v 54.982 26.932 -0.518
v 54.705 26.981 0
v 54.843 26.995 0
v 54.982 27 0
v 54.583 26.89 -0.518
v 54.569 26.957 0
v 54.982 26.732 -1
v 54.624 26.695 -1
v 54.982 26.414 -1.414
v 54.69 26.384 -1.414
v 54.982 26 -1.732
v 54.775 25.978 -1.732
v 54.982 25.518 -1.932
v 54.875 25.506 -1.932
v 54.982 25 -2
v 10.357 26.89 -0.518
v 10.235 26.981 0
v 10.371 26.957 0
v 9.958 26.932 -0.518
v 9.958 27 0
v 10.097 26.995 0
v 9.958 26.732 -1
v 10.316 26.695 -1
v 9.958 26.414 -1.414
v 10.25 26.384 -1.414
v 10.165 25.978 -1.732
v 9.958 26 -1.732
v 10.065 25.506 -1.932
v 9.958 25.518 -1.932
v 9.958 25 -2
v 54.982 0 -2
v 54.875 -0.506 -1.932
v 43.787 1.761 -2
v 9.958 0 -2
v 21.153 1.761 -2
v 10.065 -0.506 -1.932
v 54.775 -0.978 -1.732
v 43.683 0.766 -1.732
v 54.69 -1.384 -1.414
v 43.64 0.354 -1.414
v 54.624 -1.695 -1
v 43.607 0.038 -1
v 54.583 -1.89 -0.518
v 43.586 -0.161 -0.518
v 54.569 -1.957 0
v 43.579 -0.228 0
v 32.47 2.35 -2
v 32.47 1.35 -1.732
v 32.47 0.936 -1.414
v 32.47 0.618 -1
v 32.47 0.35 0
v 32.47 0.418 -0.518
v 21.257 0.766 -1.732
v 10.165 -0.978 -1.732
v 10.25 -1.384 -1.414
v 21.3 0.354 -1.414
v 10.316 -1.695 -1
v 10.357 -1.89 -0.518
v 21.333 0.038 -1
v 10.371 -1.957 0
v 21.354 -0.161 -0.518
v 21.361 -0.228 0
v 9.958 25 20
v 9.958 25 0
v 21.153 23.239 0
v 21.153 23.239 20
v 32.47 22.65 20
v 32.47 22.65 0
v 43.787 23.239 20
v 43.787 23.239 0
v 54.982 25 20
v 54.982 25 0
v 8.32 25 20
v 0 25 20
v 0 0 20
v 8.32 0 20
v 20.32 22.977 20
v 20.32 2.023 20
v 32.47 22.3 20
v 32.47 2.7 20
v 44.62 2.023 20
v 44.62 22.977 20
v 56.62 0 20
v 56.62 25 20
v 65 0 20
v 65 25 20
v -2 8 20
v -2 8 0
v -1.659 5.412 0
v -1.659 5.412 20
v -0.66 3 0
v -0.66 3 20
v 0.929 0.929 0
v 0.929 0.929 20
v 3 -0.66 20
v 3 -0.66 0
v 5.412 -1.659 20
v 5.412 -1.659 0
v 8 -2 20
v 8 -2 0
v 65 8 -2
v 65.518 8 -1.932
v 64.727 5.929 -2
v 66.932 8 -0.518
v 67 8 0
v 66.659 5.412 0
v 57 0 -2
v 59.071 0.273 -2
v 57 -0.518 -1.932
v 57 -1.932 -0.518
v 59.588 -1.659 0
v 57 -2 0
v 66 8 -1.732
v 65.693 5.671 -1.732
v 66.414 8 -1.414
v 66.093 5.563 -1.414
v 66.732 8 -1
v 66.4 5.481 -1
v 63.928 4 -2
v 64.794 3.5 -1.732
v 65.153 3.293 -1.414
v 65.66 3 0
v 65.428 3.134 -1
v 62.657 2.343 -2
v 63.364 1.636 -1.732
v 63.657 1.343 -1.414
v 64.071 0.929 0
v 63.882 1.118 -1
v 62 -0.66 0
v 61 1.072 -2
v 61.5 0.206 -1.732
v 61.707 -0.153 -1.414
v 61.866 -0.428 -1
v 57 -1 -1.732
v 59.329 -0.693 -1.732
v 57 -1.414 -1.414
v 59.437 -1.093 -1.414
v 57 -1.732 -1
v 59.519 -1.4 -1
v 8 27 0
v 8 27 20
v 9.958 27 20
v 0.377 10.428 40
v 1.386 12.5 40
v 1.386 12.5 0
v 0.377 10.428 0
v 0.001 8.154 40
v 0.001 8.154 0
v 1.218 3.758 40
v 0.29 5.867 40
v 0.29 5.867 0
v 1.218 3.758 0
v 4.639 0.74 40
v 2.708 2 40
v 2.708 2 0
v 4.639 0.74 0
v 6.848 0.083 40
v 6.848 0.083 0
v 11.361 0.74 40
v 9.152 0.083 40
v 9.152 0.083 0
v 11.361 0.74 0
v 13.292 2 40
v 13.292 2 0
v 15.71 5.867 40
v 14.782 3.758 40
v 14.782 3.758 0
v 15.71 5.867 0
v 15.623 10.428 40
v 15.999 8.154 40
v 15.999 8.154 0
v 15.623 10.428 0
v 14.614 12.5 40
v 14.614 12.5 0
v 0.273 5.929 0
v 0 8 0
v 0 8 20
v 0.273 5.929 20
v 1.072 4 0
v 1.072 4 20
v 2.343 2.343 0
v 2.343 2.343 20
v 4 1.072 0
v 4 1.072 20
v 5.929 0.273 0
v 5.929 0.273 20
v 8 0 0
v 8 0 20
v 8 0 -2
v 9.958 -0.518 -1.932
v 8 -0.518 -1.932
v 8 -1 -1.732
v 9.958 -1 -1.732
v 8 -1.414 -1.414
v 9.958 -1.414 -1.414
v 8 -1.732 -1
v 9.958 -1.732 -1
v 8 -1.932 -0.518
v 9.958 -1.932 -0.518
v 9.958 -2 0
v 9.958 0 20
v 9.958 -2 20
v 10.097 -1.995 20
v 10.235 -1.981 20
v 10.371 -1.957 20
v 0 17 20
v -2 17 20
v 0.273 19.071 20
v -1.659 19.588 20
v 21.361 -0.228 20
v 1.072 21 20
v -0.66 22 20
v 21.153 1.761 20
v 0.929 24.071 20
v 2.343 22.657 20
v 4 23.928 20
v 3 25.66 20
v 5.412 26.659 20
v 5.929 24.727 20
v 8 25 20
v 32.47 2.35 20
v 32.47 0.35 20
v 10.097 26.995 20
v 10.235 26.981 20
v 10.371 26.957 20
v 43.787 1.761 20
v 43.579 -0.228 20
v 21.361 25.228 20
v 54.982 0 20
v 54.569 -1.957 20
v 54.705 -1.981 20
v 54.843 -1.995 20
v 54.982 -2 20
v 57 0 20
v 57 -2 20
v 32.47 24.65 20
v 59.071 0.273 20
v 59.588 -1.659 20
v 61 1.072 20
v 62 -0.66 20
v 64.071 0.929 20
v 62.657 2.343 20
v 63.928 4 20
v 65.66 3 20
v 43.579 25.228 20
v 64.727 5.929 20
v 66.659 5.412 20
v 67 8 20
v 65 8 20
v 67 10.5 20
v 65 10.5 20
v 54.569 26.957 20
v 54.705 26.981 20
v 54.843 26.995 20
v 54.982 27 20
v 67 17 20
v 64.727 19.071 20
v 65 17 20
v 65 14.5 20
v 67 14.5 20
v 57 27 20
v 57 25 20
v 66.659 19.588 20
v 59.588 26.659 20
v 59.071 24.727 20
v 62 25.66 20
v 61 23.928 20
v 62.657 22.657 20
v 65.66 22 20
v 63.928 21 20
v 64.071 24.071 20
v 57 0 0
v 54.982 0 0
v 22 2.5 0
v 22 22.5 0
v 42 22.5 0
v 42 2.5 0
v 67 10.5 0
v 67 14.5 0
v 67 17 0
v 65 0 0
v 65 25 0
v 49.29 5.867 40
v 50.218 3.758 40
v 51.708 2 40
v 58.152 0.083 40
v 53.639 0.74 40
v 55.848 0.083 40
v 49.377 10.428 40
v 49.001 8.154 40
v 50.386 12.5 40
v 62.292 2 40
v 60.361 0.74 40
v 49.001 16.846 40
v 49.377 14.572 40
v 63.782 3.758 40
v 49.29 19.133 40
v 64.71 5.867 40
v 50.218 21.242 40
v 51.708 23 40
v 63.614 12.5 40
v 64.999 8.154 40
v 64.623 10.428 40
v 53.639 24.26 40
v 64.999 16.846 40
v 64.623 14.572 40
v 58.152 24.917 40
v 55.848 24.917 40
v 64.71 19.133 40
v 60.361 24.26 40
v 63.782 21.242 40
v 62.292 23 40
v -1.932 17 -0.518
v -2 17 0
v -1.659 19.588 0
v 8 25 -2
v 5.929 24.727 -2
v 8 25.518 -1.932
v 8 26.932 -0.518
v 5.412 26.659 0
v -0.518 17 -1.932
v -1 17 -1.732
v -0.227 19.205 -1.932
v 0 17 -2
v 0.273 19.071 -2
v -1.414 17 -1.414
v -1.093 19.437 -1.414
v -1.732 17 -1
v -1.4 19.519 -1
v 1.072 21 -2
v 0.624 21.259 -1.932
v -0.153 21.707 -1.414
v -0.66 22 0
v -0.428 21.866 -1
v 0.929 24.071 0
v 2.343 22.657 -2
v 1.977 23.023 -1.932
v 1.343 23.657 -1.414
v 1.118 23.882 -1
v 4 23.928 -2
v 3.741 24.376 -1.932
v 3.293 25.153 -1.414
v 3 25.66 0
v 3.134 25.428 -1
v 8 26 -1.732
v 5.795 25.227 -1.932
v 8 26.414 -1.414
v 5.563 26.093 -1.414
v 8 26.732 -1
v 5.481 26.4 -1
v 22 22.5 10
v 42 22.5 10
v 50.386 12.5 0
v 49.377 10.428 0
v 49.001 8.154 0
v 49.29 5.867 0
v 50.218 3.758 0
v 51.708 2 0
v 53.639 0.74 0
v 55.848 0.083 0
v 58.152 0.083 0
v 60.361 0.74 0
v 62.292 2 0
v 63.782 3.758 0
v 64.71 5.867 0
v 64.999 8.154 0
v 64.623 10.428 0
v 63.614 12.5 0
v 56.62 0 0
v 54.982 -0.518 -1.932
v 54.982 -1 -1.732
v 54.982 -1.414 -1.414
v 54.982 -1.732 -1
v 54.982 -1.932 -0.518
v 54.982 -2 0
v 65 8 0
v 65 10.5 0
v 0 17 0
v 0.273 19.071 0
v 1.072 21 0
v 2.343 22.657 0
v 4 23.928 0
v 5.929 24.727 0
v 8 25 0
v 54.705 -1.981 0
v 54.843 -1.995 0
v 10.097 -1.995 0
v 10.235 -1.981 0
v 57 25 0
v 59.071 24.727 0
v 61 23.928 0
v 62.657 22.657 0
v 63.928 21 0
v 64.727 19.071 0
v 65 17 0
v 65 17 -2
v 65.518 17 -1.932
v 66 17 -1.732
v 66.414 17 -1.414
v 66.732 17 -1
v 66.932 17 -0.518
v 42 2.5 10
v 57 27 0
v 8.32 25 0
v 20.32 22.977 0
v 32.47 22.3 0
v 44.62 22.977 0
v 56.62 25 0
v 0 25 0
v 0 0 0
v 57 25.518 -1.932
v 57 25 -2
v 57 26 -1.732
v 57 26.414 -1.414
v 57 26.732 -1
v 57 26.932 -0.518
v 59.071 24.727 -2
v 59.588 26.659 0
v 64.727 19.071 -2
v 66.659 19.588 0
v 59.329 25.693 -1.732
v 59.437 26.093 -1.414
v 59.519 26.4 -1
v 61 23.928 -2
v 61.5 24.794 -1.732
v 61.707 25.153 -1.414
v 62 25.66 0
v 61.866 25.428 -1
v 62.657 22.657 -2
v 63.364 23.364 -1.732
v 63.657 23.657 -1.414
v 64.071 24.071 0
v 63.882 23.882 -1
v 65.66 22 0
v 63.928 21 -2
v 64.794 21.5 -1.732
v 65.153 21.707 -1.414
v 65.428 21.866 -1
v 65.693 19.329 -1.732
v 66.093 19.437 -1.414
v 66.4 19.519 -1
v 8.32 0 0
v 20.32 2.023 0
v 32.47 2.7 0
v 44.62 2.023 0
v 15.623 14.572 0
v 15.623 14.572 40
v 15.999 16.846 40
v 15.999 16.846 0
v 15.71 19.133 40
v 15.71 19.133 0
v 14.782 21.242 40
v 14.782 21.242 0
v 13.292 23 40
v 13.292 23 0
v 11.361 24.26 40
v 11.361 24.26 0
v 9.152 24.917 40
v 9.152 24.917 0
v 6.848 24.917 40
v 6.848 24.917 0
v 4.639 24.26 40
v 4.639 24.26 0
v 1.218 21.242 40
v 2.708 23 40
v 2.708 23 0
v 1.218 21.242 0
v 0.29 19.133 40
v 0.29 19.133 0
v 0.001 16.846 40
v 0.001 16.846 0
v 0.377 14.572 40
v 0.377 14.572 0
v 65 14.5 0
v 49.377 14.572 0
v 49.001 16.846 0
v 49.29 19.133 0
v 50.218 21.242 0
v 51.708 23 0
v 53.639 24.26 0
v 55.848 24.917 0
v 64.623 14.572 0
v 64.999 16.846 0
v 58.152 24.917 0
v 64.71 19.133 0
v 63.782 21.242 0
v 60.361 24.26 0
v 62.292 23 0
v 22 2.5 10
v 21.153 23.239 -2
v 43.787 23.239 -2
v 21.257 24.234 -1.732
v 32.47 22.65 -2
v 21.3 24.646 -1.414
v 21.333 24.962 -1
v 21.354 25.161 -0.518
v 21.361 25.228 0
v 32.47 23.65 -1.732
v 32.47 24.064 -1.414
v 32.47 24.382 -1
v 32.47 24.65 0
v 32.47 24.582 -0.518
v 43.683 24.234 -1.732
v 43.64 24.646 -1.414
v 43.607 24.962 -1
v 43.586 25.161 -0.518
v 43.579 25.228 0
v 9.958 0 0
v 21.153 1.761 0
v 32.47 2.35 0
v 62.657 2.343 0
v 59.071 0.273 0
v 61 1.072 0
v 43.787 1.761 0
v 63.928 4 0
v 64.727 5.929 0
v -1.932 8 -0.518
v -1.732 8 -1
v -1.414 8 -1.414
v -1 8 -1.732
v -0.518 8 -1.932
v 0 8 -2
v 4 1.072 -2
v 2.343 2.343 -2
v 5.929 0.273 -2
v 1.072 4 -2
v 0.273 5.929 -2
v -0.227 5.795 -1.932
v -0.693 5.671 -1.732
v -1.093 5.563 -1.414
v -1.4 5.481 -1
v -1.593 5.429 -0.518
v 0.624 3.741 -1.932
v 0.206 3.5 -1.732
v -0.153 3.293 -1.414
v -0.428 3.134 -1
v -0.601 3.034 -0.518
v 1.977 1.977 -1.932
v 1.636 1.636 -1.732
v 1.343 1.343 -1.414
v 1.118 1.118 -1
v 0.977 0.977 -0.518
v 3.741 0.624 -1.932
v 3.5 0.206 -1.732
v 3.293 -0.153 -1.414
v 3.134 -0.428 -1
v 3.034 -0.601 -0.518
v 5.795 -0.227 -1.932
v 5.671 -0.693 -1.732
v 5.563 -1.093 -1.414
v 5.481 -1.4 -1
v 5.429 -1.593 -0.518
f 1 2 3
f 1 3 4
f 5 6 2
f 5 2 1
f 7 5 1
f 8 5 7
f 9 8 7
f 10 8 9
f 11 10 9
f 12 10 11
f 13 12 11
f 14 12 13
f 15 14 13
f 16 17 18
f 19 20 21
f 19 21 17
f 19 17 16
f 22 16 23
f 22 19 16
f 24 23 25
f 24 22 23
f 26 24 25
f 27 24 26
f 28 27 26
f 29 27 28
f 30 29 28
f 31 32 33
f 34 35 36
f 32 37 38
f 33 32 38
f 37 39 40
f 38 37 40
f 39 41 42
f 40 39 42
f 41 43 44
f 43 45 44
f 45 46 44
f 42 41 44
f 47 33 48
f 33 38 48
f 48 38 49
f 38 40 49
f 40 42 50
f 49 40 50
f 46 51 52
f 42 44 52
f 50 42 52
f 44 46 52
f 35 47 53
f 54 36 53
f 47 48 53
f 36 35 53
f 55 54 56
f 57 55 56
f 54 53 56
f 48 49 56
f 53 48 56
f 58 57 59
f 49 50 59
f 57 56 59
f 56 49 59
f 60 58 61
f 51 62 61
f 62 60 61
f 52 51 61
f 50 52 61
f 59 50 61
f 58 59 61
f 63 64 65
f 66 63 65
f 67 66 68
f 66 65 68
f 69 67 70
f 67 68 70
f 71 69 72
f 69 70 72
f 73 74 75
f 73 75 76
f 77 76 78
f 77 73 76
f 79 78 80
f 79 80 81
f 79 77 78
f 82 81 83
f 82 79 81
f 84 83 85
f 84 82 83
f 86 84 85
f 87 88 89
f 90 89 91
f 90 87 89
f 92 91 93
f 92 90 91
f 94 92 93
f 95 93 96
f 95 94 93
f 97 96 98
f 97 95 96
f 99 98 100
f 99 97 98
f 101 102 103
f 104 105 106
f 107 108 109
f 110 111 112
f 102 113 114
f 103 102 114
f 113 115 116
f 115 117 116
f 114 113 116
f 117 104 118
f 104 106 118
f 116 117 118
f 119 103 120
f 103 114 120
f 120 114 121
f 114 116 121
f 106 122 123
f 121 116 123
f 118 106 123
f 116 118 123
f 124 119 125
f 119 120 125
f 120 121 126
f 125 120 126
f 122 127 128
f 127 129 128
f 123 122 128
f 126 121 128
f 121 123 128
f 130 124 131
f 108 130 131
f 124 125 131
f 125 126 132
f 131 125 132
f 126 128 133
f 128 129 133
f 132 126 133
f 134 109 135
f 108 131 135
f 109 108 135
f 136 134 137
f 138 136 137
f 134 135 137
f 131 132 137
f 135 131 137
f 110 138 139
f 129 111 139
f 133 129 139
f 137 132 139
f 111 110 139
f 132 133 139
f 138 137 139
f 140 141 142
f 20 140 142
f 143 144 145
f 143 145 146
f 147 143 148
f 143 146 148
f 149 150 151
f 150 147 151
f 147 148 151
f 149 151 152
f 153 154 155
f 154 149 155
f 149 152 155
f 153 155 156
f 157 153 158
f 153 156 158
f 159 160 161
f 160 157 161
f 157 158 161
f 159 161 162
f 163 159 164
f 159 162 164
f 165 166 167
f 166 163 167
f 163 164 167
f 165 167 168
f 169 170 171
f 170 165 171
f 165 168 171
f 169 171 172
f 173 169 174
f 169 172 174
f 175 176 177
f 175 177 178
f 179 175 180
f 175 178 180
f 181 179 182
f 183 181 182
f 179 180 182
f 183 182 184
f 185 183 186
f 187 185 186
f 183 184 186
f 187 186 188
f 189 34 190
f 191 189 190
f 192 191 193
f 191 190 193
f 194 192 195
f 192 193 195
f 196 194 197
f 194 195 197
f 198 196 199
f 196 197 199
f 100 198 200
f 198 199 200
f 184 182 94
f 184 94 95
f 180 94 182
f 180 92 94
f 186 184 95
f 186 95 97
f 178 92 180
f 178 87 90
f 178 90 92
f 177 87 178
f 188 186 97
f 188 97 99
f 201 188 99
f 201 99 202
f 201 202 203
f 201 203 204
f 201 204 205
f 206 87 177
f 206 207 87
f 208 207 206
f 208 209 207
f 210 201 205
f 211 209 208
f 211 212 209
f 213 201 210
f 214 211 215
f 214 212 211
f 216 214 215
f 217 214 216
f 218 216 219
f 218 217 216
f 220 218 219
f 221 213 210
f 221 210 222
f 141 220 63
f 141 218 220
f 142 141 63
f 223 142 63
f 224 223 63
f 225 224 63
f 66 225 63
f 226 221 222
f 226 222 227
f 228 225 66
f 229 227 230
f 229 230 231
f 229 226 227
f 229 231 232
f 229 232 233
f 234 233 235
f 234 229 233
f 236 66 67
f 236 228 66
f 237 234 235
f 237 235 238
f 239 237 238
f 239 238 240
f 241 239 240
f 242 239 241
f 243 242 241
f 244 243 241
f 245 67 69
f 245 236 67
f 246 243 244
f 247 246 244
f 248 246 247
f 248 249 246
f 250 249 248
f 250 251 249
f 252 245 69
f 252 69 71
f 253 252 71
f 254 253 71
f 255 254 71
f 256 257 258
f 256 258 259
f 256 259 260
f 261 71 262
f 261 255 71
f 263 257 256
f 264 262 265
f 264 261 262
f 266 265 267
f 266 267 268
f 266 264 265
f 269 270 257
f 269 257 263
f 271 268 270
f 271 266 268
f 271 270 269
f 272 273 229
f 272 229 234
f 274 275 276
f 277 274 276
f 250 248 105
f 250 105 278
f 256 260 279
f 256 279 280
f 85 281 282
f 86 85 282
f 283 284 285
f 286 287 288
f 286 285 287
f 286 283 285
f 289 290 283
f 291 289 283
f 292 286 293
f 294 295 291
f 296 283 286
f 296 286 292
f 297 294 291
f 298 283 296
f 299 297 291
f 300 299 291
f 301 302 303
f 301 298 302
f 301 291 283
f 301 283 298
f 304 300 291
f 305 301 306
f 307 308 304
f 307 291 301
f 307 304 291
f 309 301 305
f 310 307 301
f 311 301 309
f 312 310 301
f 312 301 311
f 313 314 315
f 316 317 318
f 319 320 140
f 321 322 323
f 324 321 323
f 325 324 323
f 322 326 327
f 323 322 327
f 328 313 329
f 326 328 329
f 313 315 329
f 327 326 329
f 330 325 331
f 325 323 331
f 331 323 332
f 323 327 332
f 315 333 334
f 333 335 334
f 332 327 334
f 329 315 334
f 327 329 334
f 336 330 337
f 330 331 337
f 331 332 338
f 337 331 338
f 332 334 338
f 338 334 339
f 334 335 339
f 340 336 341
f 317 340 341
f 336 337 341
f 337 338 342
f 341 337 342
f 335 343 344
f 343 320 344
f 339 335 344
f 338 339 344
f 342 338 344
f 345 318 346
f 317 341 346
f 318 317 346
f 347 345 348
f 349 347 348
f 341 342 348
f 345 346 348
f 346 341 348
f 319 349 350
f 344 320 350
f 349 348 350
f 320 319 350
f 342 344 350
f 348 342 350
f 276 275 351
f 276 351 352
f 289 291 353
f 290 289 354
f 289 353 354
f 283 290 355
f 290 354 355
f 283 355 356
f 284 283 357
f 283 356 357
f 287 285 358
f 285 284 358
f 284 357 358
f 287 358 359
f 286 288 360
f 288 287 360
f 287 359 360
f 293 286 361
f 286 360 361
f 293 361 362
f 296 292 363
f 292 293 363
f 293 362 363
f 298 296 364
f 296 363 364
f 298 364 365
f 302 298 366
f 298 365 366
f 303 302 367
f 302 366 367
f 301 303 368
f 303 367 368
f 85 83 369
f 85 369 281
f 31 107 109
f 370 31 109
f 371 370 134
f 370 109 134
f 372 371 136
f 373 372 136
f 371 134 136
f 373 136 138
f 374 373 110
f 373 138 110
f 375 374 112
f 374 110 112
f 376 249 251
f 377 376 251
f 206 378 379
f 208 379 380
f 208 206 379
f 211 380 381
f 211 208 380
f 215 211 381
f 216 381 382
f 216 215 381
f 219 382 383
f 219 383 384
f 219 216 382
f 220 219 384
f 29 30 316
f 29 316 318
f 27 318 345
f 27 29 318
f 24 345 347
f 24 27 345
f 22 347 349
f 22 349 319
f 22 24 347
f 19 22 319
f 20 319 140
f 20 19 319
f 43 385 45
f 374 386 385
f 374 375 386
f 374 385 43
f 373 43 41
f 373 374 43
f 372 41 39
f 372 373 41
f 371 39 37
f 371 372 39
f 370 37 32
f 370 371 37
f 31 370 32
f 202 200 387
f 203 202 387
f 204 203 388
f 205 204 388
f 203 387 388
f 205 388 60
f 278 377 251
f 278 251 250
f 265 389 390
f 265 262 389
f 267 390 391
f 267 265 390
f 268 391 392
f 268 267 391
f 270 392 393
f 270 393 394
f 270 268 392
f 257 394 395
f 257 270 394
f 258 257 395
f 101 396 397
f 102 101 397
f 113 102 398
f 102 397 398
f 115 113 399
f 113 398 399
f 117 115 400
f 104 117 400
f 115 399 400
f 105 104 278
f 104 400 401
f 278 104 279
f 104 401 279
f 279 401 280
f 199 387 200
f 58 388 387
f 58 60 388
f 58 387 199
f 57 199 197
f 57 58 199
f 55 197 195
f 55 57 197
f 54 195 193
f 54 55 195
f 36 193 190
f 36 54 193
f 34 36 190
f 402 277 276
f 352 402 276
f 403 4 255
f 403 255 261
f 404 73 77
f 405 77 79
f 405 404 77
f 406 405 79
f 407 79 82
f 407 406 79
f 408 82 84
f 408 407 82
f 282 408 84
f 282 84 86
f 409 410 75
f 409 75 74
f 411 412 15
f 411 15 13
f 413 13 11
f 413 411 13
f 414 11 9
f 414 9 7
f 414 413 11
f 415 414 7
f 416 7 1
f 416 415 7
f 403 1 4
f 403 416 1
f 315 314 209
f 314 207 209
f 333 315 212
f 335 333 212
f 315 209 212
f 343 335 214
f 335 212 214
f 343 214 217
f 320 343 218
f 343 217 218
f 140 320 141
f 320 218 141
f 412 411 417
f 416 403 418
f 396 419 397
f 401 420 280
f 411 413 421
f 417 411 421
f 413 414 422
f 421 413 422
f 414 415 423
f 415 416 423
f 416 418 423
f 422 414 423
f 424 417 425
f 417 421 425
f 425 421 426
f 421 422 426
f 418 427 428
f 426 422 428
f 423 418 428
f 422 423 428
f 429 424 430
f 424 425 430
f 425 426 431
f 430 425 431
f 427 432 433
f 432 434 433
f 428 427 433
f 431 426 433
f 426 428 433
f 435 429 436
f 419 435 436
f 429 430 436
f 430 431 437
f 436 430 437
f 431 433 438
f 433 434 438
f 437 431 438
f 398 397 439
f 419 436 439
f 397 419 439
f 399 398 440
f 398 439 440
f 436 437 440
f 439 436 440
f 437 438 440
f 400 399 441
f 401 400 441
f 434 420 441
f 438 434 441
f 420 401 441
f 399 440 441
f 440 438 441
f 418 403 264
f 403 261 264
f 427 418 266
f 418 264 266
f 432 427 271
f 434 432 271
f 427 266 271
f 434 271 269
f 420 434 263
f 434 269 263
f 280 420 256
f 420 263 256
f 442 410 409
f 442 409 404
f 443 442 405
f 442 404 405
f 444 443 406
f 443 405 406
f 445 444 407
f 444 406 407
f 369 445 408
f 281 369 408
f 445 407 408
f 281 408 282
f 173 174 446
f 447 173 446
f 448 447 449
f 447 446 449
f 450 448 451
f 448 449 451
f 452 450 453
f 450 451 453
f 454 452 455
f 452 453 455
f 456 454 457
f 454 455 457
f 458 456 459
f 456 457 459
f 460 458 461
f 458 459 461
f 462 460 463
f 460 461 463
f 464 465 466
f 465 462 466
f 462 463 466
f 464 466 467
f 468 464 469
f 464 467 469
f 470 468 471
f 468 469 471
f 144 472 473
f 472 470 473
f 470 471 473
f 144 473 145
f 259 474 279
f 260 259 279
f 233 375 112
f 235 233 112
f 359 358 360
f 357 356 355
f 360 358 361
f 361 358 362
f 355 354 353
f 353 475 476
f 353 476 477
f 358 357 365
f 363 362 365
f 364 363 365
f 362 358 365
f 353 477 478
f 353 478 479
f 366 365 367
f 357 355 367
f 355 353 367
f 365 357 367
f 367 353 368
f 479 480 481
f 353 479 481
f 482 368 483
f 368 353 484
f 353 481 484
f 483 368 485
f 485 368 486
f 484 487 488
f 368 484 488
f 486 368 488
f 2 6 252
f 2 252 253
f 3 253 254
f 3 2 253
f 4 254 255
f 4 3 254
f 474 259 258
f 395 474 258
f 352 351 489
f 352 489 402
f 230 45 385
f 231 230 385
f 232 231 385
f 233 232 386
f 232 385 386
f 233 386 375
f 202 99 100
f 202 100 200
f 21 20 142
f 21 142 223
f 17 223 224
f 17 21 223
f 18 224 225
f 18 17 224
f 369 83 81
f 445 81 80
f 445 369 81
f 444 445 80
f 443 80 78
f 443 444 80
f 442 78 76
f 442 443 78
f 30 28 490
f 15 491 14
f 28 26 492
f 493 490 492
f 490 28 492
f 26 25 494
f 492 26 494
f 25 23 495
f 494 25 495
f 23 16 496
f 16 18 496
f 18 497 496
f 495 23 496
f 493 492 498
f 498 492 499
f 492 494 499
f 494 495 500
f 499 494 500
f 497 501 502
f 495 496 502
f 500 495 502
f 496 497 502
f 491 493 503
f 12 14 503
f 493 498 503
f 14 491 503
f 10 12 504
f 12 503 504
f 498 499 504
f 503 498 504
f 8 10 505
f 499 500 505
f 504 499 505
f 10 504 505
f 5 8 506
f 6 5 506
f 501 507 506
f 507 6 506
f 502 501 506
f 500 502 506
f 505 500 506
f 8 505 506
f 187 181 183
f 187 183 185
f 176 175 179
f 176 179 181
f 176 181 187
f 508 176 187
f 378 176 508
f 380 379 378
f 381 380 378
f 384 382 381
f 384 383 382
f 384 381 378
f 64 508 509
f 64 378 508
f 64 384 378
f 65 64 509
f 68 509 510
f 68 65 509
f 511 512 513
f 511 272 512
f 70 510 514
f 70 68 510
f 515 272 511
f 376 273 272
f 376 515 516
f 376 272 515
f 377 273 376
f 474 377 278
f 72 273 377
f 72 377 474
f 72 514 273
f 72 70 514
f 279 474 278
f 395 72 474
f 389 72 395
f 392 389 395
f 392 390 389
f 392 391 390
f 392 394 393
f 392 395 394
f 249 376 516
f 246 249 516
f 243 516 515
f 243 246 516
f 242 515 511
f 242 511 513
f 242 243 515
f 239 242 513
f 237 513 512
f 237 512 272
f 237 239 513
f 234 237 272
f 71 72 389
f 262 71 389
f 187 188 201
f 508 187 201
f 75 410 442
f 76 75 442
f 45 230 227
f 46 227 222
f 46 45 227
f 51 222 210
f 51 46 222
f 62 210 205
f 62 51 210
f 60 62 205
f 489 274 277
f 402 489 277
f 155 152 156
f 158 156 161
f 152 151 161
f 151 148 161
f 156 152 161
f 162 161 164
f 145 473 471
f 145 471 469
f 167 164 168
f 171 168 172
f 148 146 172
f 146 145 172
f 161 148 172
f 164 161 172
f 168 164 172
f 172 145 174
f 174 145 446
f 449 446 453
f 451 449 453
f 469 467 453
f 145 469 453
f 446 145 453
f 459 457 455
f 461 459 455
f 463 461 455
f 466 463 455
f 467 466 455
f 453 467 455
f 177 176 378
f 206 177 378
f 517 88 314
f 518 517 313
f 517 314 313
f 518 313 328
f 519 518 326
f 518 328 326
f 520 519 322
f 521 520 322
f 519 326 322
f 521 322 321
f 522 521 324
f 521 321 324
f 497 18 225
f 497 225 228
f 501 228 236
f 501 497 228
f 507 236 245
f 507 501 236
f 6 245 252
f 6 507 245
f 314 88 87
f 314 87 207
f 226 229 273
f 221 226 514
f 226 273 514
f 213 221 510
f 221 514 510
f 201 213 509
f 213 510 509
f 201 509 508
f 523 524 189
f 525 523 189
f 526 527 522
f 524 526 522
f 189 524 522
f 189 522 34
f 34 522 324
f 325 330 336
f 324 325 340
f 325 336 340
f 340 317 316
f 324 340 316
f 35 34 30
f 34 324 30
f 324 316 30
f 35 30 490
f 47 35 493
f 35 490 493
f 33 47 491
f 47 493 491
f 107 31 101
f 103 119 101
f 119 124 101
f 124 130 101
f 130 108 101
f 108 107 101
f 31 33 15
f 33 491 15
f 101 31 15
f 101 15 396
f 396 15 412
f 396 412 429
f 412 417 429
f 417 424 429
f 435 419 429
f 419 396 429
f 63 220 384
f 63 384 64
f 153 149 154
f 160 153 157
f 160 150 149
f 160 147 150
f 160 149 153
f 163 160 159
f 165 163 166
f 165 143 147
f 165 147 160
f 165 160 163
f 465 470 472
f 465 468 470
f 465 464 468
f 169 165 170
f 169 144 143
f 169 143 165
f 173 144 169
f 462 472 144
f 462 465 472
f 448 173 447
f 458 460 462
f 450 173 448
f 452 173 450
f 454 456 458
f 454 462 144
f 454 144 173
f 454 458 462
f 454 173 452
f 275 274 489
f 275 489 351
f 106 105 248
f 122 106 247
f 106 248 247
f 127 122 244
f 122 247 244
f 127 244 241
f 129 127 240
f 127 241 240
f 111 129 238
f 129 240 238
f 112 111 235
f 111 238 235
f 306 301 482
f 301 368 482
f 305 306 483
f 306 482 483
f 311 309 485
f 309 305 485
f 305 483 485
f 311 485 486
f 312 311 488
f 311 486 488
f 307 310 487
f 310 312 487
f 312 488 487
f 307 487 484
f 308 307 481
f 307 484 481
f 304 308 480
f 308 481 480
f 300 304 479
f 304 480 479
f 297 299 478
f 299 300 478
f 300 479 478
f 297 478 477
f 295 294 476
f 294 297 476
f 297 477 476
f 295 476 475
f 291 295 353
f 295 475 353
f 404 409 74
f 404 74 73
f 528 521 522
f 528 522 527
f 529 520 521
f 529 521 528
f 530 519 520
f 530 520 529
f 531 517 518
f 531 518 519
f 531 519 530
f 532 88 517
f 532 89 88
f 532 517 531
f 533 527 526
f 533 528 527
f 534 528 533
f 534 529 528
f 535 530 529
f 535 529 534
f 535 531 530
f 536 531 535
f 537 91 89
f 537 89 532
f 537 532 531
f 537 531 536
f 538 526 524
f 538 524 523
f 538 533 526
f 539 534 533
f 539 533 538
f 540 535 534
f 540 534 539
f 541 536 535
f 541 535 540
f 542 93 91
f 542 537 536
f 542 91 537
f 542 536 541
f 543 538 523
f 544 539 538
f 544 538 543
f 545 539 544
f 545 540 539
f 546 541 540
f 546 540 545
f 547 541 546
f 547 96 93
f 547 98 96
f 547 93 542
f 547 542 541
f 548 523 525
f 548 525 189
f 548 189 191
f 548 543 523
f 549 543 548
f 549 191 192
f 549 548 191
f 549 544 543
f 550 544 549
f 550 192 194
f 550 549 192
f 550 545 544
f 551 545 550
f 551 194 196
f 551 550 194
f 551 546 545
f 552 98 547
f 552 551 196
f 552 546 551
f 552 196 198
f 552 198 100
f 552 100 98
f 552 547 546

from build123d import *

# Parameters (mm, degrees)
CYLINDER001_R     = 8
CYLINDER001_DEPTH = 40
CYLINDER_R        = 8
CYLINDER_DEPTH    = 40
CYLINDER003_R     = 8
CYLINDER003_DEPTH = 40
CYLINDER002_R     = 8
CYLINDER002_DEPTH = 40
CYLINDER007_R     = 109.35
CYLINDER007_DEPTH = 40
CYLINDER006_R     = 109.35
CYLINDER006_DEPTH = 40
BOX001_W          = 65
BOX001_H          = 25
BOX001_DEPTH      = 20
BOX002_W          = 5
BOX002_H          = 4
BOX002_DEPTH      = 20
CYLINDER004_R     = 109
CYLINDER004_DEPTH = 40
CYLINDER005_R     = 109
CYLINDER005_DEPTH = 40
BOX_W             = 65
BOX_H             = 25
BOX_DEPTH         = 20
FILLET_R          = 8
THICKNESS_T       = 2
BOX003_W          = 20
BOX003_H          = 20
BOX003_DEPTH      = 10


with BuildPart() as cilindro_alto_izq:
    # Cylinder001 → Cylinder001 (new body)
    with BuildSketch(Plane(origin=(8, 17, 0), x_dir=(1, 0, 0), z_dir=(0, 0, 1))):
        Circle(CYLINDER001_R)
    extrude(amount=CYLINDER001_DEPTH)


with BuildPart() as fusion_cilindros_izq:
    # Cylinder → Cylinder (new body)
    with BuildSketch(Plane(origin=(8, 8, 0), x_dir=(1, 0, 0), z_dir=(0, 0, 1))):
        Circle(CYLINDER_R)
    extrude(amount=CYLINDER_DEPTH)

    # Fusion: union Cilindro_alto_izq
    add(cilindro_alto_izq.part)


with BuildPart() as cilindro_baj_der:
    # Cylinder003 → Cylinder003 (new body)
    with BuildSketch(Plane(origin=(57, 8, 0), x_dir=(1, 0, 0), z_dir=(0, 0, 1))):
        Circle(CYLINDER003_R)
    extrude(amount=CYLINDER003_DEPTH)


with BuildPart() as fusion_cilindros_derec:
    # Cylinder002 → Cylinder002 (new body)
    with BuildSketch(Plane(origin=(57, 17, 0), x_dir=(1, 0, 0), z_dir=(0, 0, 1))):
        Circle(CYLINDER002_R)
    extrude(amount=CYLINDER002_DEPTH)

    # Fusion001: union Cilindro_baj_der
    add(cilindro_baj_der.part)


with BuildPart() as cilindro_bajo_grande001:
    # Cylinder007 → Cylinder007 (new body)
    with BuildSketch(Plane(origin=(32.47, -106.65, 0), x_dir=(1, 0, 0), z_dir=(0, 0, 1))):
        Circle(CYLINDER007_R)
    extrude(amount=CYLINDER007_DEPTH)


with BuildPart() as cilindro_alto_grande001:
    # Cylinder006 → Cylinder006 (new body)
    with BuildSketch(Plane(origin=(32.47, 131.65, 0), x_dir=(1, 0, 0), z_dir=(0, 0, 1))):
        Circle(CYLINDER006_R)
    extrude(amount=CYLINDER006_DEPTH)


with BuildPart() as diferencia_curvas_superior_e_inferior001:
    # Box001 → Box001 (new body)
    with BuildSketch(Plane.XY):
        with Locations((32.5, 12.5)):
            Rectangle(BOX001_W, BOX001_H)
    extrude(amount=BOX001_DEPTH)

    # Cut002: cut Cilindro_Alto_grande001
    add(cilindro_alto_grande001.part, mode=Mode.SUBTRACT)

    # Cut003: cut Cilindro_Bajo_grande001
    add(cilindro_bajo_grande001.part, mode=Mode.SUBTRACT)


with BuildPart() as ranura:
    # Box002 → Box002 (new body)
    with BuildSketch(Plane(origin=(65, 10.5, 0), x_dir=(1, 0, 0), z_dir=(0, 0, 1))):
        with Locations((2.5, 2)):
            Rectangle(BOX002_W, BOX002_H)
    extrude(amount=BOX002_DEPTH)


with BuildPart() as cilindro_bajo_grande:
    # Cylinder004 → Cylinder004 (new body)
    with BuildSketch(Plane(origin=(32.47, -106.65, 0), x_dir=(1, 0, 0), z_dir=(0, 0, 1))):
        Circle(CYLINDER004_R)
    extrude(amount=CYLINDER004_DEPTH)


with BuildPart() as cilindro_alto_grande:
    # Cylinder005 → Cylinder005 (new body)
    with BuildSketch(Plane(origin=(32.47, 131.65, 0), x_dir=(1, 0, 0), z_dir=(0, 0, 1))):
        Circle(CYLINDER005_R)
    extrude(amount=CYLINDER005_DEPTH)


with BuildPart() as final:
    # Box → Box (new body)
    with BuildSketch(Plane.XY):
        with Locations((32.5, 12.5)):
            Rectangle(BOX_W, BOX_H)
    extrude(amount=BOX_DEPTH)

    # Cut: cut Cilindro_Alto_grande
    add(cilindro_alto_grande.part, mode=Mode.SUBTRACT)

    # Cut001: cut Cilindro_Bajo_grande
    add(cilindro_bajo_grande.part, mode=Mode.SUBTRACT)

    # Fillet
    fillet_edges = [final.edges().sort_by_distance(p)[0] for p in [
        (0, 0, 10),
        (0, 25, 10),
        (65, 25, 10),
        (65, 0, 10),
    ]]
    fillet(fillet_edges, radius=FILLET_R)

    # Thickness
    thickness_openings = [final.faces().sort_by_distance(p)[0] for p in [
        (32.502969, 12.5, 20),
    ]]
    offset(amount=THICKNESS_T, openings=thickness_openings)

    # Cut004: cut ranura
    add(ranura.part, mode=Mode.SUBTRACT)


with BuildPart() as referencia_interior:
    # Box003 → Box003 (new body)
    with BuildSketch(Plane(origin=(22, 2.5, 0), x_dir=(1, 0, 0), z_dir=(0, 0, 1))):
        with Locations((10, 10)):
            Rectangle(BOX003_W, BOX003_H)
    extrude(amount=BOX003_DEPTH)


solid = Compound([fusion_cilindros_izq.part, fusion_cilindros_derec.part, diferencia_curvas_superior_e_inferior001.part, final.part, referencia_interior.part])
